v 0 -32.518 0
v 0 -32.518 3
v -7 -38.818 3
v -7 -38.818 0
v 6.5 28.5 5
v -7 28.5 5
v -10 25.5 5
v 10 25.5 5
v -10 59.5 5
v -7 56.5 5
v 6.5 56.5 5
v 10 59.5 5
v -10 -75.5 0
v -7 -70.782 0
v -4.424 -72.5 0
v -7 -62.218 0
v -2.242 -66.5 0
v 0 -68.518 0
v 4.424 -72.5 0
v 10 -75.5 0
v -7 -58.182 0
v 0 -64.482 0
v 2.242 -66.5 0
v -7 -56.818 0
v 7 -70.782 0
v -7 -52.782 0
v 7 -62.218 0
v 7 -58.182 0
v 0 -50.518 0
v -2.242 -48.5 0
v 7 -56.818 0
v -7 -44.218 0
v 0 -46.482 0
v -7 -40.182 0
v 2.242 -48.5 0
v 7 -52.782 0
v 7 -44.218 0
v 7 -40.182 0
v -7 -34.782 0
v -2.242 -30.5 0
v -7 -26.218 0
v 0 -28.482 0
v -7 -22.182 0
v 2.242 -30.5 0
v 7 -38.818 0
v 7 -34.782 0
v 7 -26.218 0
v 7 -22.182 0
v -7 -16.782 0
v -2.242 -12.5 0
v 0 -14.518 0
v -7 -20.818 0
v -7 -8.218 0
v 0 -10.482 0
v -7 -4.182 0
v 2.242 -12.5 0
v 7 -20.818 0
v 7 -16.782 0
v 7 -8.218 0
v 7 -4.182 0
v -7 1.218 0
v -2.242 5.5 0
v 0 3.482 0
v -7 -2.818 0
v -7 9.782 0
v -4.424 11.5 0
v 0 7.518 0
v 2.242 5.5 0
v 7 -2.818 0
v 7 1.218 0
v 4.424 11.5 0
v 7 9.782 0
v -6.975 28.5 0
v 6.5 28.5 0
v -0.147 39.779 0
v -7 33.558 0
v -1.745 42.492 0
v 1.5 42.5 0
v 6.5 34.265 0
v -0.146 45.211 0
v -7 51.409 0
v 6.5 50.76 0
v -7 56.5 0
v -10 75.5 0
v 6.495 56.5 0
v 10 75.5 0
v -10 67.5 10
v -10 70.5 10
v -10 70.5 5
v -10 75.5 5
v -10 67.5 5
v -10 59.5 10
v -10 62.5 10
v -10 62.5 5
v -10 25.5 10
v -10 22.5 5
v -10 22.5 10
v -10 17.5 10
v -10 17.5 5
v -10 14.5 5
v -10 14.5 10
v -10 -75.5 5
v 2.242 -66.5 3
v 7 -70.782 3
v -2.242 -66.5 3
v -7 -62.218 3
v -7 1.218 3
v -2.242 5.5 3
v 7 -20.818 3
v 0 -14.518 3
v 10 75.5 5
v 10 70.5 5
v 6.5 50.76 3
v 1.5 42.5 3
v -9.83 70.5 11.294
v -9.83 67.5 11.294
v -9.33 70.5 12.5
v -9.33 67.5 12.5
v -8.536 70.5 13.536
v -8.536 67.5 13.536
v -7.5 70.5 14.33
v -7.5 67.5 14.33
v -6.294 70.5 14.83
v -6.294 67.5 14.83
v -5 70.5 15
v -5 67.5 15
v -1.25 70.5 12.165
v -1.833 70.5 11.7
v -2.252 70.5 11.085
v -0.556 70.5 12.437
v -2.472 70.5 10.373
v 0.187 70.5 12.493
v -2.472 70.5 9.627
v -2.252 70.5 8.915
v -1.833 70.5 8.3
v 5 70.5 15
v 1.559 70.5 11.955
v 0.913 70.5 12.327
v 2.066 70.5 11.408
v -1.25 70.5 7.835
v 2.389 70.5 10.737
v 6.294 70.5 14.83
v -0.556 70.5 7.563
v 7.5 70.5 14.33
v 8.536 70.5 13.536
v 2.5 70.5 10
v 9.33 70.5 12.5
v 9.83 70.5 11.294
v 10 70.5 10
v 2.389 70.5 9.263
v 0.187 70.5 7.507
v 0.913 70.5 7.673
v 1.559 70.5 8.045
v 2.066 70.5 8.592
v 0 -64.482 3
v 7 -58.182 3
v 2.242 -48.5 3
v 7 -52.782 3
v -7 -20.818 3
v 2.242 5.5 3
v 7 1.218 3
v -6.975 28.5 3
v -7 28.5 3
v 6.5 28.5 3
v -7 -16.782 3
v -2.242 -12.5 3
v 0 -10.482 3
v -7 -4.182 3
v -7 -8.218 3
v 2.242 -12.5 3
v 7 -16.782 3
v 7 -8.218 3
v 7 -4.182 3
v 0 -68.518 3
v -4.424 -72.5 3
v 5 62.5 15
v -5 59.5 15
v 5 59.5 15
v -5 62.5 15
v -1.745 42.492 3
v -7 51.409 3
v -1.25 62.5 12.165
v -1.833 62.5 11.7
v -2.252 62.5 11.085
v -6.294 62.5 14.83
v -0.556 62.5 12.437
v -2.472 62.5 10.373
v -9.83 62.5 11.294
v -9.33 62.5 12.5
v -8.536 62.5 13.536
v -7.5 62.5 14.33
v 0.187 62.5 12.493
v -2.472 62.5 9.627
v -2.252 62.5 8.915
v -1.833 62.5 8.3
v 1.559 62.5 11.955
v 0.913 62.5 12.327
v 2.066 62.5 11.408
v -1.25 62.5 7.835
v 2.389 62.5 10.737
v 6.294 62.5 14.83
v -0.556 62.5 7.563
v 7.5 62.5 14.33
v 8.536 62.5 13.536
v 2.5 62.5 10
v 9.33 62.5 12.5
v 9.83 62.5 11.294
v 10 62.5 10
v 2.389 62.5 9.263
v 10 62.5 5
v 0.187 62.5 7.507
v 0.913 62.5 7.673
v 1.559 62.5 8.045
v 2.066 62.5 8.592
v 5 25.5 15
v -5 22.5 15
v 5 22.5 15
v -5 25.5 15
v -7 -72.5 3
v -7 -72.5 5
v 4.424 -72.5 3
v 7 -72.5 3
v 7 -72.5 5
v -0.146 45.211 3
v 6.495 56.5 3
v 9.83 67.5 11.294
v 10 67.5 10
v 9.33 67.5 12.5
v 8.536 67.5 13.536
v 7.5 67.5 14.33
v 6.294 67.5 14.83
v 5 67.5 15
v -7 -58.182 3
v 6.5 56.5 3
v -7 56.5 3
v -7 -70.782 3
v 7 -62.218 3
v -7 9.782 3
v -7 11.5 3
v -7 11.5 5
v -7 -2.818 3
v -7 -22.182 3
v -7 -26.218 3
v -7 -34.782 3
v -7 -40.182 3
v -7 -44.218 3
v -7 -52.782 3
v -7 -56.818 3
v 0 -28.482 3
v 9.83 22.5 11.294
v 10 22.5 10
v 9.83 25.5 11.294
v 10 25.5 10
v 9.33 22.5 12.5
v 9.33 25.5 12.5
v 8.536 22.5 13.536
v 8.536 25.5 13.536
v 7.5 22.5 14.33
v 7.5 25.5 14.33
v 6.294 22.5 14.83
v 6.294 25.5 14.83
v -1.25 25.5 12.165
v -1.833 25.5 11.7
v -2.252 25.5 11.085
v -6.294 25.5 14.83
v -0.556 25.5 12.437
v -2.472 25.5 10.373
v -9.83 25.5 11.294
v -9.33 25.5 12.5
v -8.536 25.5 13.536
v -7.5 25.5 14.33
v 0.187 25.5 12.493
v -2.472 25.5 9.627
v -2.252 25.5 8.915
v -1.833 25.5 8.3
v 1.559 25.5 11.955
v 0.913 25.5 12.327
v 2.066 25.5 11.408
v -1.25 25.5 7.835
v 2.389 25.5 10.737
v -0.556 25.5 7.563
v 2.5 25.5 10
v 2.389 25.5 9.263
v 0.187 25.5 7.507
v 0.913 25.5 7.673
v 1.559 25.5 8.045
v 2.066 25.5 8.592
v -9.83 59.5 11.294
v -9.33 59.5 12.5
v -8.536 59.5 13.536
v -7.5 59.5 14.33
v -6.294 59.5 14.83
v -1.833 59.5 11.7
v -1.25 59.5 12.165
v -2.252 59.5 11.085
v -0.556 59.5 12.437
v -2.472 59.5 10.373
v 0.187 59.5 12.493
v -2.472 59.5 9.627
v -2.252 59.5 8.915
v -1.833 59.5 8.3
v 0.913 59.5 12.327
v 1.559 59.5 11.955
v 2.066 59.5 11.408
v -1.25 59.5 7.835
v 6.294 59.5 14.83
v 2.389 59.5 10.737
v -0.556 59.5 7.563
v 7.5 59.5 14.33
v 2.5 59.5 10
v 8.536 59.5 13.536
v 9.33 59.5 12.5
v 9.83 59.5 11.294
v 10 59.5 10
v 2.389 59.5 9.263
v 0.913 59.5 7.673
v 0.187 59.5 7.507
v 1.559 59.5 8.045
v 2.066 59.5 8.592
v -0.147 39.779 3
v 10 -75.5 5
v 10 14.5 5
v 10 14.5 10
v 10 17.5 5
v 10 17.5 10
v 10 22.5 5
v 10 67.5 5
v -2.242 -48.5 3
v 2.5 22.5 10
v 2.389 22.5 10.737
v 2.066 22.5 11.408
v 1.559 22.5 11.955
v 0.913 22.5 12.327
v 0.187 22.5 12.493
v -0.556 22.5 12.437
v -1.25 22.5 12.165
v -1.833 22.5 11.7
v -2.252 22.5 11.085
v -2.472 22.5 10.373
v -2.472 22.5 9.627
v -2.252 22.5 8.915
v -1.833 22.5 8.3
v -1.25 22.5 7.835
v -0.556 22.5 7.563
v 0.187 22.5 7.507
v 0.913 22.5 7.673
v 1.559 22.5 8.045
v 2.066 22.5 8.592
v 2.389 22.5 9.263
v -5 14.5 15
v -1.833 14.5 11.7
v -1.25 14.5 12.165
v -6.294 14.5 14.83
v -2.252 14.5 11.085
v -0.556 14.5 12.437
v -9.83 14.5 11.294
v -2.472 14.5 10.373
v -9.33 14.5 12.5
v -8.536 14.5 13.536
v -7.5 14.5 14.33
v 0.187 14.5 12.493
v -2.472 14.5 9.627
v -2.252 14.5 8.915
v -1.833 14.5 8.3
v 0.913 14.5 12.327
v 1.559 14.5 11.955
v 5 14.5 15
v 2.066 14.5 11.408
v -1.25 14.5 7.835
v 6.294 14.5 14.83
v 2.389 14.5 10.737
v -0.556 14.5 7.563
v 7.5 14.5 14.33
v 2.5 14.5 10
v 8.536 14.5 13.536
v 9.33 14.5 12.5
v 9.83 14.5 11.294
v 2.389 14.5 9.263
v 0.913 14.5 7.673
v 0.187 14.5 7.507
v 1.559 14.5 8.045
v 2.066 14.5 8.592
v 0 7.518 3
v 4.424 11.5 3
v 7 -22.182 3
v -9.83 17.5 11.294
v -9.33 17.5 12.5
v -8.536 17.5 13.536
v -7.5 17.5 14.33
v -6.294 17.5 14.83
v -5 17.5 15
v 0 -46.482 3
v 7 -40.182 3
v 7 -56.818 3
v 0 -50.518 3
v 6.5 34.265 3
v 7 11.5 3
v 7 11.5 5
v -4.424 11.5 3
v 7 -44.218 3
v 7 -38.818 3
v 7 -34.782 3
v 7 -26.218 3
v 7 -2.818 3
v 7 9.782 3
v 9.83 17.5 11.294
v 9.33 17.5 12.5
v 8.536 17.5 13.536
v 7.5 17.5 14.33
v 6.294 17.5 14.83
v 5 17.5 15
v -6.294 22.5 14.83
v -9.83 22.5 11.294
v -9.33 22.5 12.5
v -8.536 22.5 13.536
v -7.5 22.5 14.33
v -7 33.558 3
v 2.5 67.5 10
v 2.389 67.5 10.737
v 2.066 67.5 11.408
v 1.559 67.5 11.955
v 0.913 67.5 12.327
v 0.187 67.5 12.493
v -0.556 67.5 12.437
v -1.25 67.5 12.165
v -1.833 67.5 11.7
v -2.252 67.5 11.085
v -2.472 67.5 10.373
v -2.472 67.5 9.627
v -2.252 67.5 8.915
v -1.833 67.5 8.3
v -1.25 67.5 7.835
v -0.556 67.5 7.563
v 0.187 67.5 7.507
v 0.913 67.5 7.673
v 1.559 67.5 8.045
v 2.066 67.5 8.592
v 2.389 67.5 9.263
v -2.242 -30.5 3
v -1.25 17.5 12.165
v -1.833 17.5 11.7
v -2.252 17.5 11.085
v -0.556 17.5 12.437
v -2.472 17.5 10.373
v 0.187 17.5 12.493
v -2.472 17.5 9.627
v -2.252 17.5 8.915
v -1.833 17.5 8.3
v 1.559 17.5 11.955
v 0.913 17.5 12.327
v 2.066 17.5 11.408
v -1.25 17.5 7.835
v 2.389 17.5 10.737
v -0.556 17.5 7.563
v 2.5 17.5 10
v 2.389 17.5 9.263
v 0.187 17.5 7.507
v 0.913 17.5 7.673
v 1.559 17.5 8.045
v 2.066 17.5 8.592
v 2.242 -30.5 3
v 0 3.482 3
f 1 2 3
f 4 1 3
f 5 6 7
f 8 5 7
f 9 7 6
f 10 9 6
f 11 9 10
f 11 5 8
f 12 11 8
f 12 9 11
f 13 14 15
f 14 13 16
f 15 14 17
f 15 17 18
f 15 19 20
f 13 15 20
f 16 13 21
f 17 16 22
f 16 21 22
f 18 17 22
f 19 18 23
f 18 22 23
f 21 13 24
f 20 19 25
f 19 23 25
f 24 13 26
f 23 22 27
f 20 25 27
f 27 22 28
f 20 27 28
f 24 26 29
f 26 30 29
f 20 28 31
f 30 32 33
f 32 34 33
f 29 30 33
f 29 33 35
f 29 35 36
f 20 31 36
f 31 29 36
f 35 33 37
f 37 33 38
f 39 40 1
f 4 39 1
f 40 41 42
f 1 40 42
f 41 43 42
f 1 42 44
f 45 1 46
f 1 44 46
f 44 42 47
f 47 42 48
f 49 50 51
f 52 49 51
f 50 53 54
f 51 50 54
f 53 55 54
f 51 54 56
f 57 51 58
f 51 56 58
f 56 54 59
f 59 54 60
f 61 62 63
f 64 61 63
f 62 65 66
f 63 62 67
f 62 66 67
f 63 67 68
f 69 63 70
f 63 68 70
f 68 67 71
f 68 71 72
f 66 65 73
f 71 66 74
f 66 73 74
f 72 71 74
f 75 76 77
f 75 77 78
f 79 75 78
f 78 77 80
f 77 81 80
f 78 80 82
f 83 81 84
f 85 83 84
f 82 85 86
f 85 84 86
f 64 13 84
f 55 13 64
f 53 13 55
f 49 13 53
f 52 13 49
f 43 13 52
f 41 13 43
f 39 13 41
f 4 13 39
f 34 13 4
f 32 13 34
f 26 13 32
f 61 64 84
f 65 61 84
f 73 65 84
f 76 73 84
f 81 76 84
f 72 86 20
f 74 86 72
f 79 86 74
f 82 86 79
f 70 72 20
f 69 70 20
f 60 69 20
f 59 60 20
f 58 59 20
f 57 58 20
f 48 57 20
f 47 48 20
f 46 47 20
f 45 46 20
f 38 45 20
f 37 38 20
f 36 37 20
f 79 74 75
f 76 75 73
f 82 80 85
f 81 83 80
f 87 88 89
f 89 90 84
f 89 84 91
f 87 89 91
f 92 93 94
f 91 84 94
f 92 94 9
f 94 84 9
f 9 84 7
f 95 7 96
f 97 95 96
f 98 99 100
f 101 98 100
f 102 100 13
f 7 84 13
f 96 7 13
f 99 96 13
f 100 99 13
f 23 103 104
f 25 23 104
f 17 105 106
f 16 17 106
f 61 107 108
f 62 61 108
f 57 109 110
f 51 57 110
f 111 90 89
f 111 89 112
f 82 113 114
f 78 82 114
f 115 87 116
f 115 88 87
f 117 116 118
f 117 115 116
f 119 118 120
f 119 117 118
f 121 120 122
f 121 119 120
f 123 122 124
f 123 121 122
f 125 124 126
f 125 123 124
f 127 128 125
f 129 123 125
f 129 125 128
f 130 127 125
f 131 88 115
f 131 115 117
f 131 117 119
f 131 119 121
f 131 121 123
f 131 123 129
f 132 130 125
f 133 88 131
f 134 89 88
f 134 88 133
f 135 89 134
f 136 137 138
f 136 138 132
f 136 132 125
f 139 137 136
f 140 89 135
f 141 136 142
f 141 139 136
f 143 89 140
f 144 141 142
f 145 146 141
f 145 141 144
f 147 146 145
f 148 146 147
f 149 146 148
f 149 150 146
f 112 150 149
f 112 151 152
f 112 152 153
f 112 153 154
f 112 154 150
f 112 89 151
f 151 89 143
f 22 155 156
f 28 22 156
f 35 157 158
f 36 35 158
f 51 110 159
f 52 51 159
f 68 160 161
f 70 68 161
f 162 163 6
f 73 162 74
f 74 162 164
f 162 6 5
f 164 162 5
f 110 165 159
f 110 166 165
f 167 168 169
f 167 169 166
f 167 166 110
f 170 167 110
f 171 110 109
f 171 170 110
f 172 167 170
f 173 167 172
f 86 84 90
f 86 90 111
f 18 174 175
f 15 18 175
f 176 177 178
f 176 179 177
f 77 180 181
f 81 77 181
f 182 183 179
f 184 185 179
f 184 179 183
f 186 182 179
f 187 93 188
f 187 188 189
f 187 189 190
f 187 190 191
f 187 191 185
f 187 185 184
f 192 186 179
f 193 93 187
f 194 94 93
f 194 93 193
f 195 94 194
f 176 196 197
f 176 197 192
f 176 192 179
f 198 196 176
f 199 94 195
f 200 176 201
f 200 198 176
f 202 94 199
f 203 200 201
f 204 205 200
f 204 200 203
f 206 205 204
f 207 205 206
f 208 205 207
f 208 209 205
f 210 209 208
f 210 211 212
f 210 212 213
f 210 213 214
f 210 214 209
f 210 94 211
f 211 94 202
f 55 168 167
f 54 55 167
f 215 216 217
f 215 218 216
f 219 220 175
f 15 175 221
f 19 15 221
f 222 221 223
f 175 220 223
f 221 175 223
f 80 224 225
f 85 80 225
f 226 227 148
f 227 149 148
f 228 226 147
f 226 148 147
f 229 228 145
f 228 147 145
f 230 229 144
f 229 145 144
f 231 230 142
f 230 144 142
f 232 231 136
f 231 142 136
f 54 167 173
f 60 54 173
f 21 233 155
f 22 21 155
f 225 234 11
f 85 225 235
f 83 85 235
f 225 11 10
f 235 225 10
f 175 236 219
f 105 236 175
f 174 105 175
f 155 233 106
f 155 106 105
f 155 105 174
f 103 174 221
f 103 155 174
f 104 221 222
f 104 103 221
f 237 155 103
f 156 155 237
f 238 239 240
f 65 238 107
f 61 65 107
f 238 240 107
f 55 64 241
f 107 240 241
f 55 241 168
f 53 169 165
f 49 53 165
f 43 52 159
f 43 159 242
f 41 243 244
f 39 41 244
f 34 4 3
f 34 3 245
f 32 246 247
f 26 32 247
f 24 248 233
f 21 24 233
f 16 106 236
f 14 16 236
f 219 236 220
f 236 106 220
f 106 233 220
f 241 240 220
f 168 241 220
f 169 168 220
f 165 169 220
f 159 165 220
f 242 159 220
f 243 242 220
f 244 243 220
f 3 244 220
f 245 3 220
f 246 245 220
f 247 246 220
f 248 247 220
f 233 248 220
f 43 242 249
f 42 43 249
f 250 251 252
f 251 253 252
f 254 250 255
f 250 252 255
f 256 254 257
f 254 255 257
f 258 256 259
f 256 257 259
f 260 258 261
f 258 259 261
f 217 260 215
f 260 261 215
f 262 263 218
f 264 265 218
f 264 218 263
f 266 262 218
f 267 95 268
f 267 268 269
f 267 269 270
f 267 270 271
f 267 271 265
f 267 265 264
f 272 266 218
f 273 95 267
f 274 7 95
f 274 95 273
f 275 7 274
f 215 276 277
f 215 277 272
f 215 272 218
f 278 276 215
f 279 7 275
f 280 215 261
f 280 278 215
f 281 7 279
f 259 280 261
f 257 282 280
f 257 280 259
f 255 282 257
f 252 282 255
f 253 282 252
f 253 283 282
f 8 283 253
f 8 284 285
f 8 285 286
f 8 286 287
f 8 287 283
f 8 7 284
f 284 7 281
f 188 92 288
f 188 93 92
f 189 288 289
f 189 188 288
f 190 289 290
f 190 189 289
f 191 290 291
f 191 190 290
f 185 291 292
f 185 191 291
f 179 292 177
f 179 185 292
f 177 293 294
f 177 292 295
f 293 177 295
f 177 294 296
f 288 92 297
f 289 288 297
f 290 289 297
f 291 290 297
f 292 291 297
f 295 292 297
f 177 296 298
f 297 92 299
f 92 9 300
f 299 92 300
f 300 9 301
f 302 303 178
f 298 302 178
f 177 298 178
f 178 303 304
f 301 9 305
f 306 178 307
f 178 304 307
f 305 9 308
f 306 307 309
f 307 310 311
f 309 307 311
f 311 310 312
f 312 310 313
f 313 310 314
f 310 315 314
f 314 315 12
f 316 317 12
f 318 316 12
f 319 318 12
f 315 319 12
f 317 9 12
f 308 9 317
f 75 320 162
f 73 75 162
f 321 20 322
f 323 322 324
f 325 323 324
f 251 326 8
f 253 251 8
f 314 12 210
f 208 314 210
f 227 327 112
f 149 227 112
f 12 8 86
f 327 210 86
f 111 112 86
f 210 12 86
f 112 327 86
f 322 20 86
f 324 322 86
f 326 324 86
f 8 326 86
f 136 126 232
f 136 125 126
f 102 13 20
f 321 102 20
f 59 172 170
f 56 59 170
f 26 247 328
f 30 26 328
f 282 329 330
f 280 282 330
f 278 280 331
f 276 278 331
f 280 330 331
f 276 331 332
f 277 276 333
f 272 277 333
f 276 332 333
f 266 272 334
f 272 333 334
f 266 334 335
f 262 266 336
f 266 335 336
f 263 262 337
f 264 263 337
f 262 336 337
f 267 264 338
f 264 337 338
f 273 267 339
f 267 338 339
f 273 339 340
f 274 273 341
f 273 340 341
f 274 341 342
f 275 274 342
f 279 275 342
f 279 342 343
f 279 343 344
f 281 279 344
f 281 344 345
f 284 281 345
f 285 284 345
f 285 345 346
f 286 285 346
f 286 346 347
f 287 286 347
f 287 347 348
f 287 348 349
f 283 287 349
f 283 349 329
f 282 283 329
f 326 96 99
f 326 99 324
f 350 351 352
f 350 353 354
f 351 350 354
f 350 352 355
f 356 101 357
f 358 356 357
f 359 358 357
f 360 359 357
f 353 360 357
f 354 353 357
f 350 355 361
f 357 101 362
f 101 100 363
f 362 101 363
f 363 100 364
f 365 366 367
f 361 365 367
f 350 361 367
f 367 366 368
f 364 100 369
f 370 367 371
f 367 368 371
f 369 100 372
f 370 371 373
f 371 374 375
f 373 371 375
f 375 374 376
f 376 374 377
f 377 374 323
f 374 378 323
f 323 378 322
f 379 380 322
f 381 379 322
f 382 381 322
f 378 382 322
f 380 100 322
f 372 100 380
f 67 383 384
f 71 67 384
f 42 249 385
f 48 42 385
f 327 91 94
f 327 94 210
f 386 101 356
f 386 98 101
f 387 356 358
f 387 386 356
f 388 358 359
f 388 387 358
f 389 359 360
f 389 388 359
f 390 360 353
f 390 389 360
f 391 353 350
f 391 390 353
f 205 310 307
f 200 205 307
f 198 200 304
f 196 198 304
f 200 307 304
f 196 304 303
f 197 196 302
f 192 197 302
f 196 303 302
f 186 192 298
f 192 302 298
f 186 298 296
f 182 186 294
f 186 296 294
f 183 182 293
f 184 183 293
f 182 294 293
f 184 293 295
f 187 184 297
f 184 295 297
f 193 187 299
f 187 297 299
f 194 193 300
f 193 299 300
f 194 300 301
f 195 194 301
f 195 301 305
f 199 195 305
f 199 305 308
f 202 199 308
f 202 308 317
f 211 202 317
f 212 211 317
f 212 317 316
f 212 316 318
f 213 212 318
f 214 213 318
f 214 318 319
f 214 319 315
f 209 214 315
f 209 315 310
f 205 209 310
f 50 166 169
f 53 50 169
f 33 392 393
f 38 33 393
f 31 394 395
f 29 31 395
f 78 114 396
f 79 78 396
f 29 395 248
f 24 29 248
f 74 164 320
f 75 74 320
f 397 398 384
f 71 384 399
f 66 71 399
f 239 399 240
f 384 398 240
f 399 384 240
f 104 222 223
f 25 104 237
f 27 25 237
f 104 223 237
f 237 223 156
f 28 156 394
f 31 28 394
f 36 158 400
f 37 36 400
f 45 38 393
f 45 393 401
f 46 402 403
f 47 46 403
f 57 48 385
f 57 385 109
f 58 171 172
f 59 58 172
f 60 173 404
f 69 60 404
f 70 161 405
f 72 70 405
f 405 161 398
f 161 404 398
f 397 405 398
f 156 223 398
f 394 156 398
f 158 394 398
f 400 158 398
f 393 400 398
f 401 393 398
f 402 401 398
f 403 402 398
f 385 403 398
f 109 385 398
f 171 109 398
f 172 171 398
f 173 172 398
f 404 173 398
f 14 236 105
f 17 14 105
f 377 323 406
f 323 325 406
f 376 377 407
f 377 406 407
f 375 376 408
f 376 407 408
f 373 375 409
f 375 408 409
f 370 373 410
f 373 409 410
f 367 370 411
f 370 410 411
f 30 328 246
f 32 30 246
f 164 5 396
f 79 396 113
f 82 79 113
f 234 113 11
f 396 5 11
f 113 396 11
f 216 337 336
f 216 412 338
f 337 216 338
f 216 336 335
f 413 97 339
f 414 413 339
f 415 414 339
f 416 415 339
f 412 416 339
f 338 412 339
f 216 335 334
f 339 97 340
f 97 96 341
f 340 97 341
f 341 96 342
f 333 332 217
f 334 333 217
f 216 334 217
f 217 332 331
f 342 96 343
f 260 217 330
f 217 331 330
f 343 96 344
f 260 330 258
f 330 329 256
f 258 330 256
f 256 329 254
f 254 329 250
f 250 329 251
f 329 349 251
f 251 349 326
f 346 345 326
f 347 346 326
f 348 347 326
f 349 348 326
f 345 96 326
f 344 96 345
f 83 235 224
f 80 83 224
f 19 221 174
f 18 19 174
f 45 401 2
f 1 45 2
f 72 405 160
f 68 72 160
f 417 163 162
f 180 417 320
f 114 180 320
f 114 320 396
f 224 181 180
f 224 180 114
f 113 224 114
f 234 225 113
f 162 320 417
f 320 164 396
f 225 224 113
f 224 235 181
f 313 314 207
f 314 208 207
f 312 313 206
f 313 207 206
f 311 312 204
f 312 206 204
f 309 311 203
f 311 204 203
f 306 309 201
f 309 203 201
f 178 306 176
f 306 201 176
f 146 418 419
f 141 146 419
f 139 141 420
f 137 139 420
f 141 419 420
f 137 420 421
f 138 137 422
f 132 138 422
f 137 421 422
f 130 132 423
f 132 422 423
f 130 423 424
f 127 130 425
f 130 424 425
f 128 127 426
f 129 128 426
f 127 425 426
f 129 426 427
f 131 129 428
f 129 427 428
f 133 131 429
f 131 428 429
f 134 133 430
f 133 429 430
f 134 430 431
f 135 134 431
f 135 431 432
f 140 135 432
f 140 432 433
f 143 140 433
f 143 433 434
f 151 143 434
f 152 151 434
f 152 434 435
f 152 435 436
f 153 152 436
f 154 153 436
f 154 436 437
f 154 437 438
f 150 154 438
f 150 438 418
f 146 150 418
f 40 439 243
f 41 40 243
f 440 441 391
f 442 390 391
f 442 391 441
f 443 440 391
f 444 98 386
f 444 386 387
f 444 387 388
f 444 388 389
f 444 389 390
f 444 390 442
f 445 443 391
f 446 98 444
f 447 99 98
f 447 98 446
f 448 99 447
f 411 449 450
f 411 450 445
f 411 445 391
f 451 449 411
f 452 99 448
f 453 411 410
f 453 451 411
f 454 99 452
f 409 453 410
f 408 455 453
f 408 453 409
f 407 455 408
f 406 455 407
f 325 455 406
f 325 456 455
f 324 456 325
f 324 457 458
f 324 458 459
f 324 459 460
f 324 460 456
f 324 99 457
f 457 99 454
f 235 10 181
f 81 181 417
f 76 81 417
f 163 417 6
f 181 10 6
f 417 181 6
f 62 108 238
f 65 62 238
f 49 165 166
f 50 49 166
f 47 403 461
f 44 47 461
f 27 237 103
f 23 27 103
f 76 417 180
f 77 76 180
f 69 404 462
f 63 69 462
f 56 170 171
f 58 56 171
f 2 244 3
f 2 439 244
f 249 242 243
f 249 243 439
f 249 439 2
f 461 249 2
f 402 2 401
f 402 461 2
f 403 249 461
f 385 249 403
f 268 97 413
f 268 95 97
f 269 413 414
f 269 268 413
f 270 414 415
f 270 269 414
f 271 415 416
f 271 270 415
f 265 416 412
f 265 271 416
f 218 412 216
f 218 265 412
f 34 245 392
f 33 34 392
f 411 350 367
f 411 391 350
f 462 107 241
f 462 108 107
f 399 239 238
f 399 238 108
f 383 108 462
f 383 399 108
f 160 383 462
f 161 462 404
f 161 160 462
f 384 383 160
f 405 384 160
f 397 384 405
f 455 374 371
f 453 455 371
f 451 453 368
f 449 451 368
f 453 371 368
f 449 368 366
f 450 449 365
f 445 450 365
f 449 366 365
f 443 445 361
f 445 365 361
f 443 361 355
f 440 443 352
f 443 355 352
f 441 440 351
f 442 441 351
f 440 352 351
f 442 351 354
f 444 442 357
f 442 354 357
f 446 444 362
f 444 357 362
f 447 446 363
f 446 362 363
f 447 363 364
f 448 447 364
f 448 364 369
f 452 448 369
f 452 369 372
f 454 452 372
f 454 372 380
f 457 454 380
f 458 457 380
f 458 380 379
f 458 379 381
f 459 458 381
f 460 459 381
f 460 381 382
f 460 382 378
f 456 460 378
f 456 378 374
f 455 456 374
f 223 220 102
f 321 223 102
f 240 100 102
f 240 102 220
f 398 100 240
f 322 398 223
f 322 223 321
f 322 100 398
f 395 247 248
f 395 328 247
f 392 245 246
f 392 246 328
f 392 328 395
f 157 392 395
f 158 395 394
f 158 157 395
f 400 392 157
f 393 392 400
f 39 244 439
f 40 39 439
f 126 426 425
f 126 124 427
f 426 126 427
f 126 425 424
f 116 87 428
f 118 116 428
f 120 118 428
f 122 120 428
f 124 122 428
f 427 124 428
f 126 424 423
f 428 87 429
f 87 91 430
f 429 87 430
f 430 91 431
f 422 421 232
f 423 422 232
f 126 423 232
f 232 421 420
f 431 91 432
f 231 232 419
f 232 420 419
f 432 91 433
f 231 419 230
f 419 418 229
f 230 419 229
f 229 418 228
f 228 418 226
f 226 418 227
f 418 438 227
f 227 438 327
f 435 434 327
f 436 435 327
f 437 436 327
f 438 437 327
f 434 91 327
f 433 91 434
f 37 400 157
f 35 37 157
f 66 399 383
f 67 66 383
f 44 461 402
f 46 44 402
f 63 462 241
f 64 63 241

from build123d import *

# Parameters (mm, degrees)
F0_W      = 20
F0_H      = 5
F0_H_2    = 3
F0_H_3    = 90
F0_H_4    = 34
F1_DEPTH  = 5
F2_W      = 20
F2_H      = 3
F2_H_2    = 5
F2_H_3    = 34
F3_DEPTH  = 5
F4_W      = 20
F4_H      = 3
F5_DEPTH  = 10
F6_R      = 2.5
F7_DEPTH  = 56
F8_R      = 5
F10_DEPTH = 5
F12_DEPTH = 5
F13_W     = 14
F13_H     = 84
F13_W_2   = 13.5
F13_H_2   = 28
F14_DEPTH = 2


with BuildPart() as f1:
    # F0 (on Top) → F1 (new body)
    with BuildSketch(Plane.XY):
        with Locations((0, 65)):
            Rectangle(F0_W, F0_H)
        with Locations((0, 61)):
            Rectangle(F0_W, F0_H_2)
        with Locations((0, 73)):
            Rectangle(F0_W, F0_H)
        with Locations((0, 20)):
            Rectangle(F0_W, F0_H)
        with Locations((0, 24)):
            Rectangle(F0_W, F0_H_2)
        with Locations((0, -30.5)):
            Rectangle(F0_W, F0_H_3)
        with Locations((0, 16)):
            Rectangle(F0_W, F0_H_2)
        with Locations((0, 69)):
            Rectangle(F0_W, F0_H_2)
        with Locations((0, 42.5)):
            Rectangle(F0_W, F0_H_4)
    extrude(amount=F1_DEPTH)

    # F2 (on Top) → F3 (join, through all)
    with BuildSketch(Plane.XY):
        with Locations((0, 69)):
            Rectangle(F2_W, F2_H)
        with Locations((0, 73)):
            Rectangle(F2_W, F2_H_2)
        with Locations((0, 65)):
            Rectangle(F2_W, F2_H_2)
        with Locations((0, 61)):
            Rectangle(F2_W, F2_H)
        with Locations((0, 24)):
            Rectangle(F2_W, F2_H)
        with Locations((0, 42.5)):
            Rectangle(F2_W, F2_H_3)
        with Locations((0, 20)):
            Rectangle(F2_W, F2_H_2)
        with Locations((0, 16)):
            Rectangle(F2_W, F2_H)
    extrude(amount=F3_DEPTH)

    # F4 (on face) → F5 (join)
    with BuildSketch(Plane.XY.offset(5)):
        with Locations((0, 69)):
            Rectangle(F4_W, F4_H)
        with Locations((0, 61)):
            Rectangle(F4_W, F4_H)
        with Locations((0, 24)):
            Rectangle(F4_W, F4_H)
        with Locations((0, 16)):
            Rectangle(F4_W, F4_H)
    extrude(amount=F5_DEPTH)

    # F6 (on face) → F7 (cut, through all)
    with BuildSketch(Plane.XZ.offset(-14.5)):
        with Locations((0, 10)):
            Circle(F6_R)
    extrude(amount=-F7_DEPTH, mode=Mode.SUBTRACT)

    # F8
    f8_edges = [f1.edges().sort_by_distance(p)[0] for p in [
        (10, 69, 15),
        (10, 61, 15),
        (-10, 61, 15),
        (-10, 69, 15),
        (10, 24, 15),
        (-10, 24, 15),
        (-10, 16, 15),
        (10, 16, 15),
    ]]
    fillet(f8_edges, radius=F8_R)

    # F9 (on face) → F10 (cut, through all)
    with BuildSketch(Plane.XY.offset(5)):
        Polygon((4.4243959922, 11.5), (-4.4243959922, 11.5), (0, 7.5180436071), align=None)
        Polygon((-2.2422706745, 5.5), (-7, 9.7819563929), (-7, 1.2180436071), align=None)
        Polygon((0, -14.5180436071), (-7, -20.8180436071), (-7, -22.1819563929), (0, -28.4819563929), (7, -22.1819563929), (7, -20.8180436071), align=None)
        Polygon((0, -32.5180436071), (-7, -38.8180436071), (-7, -40.1819563929), (0, -46.4819563929), (7, -40.1819563929), (7, -38.8180436071), align=None)
        Polygon((7, -52.7819563929), (7, -44.2180436071), (2.2422706745, -48.5), align=None)
        Polygon((-2.2422706745, -66.5), (-7, -62.2180436071), (-7, -70.7819563929), align=None)
        Polygon((7, -2.8180436071), (0, 3.4819563929), (-7, -2.8180436071), (-7, -4.1819563929), (0, -10.4819563929), (7, -4.1819563929), align=None)
        Polygon((7, 1.2180436071), (7, 9.7819563929), (2.2422706745, 5.5), align=None)
        Polygon((7, -16.7819563929), (7, -8.2180436071), (2.2422706745, -12.5), align=None)
        Polygon((-2.2422706745, -12.5), (-7, -8.2180436071), (-7, -16.7819563929), align=None)
        Polygon((7, -34.7819563929), (7, -26.2180436071), (2.2422706745, -30.5), align=None)
        Polygon((-2.2422706745, -30.5), (-7, -26.2180436071), (-7, -34.7819563929), align=None)
        Polygon((-2.2422706745, -48.5), (-7, -44.2180436071), (-7, -52.7819563929), align=None)
        Polygon((0, -50.5180436071), (-7, -56.8180436071), (-7, -58.1819563929), (0, -64.4819563929), (7, -58.1819563929), (7, -56.8180436071), align=None)
        Polygon((7, -70.7819563929), (7, -62.2180436071), (2.2422706745, -66.5), align=None)
        Polygon((4.4243959922, -72.5), (0, -68.5180436071), (-4.4243959922, -72.5), align=None)
    extrude(amount=-F10_DEPTH, mode=Mode.SUBTRACT)

    # F11 (on face) → F12 (cut, through all)
    with BuildSketch(Plane.XY.offset(5)):
        Polygon((-0.1457620642, 45.2106669293), (6.495022095, 56.5), (-7, 56.5), align=None)
        Polygon((6.5, 34.2647058824), (6.5, 50.7597279774), (1.5, 42.5), align=None)
        Polygon((6.5, 28.5), (-0.1468471232, 39.7794981484), (-6.9748553696, 28.5), align=None)
        Polygon((-1.7451316723, 42.4917385955), (-7, 51.4090909091), (-7, 33.5584624385), align=None)
    extrude(amount=-F12_DEPTH, mode=Mode.SUBTRACT)

    # F13 (on face) → F14 (cut, through all)
    with BuildSketch(Plane.XY.offset(5)):
        with Locations((0, -30.5)):
            Rectangle(F13_W, F13_H)
        with Locations((-0.25, 42.5)):
            Rectangle(F13_W_2, F13_H_2)
    extrude(amount=-F14_DEPTH, mode=Mode.SUBTRACT)


solid = f1.part
